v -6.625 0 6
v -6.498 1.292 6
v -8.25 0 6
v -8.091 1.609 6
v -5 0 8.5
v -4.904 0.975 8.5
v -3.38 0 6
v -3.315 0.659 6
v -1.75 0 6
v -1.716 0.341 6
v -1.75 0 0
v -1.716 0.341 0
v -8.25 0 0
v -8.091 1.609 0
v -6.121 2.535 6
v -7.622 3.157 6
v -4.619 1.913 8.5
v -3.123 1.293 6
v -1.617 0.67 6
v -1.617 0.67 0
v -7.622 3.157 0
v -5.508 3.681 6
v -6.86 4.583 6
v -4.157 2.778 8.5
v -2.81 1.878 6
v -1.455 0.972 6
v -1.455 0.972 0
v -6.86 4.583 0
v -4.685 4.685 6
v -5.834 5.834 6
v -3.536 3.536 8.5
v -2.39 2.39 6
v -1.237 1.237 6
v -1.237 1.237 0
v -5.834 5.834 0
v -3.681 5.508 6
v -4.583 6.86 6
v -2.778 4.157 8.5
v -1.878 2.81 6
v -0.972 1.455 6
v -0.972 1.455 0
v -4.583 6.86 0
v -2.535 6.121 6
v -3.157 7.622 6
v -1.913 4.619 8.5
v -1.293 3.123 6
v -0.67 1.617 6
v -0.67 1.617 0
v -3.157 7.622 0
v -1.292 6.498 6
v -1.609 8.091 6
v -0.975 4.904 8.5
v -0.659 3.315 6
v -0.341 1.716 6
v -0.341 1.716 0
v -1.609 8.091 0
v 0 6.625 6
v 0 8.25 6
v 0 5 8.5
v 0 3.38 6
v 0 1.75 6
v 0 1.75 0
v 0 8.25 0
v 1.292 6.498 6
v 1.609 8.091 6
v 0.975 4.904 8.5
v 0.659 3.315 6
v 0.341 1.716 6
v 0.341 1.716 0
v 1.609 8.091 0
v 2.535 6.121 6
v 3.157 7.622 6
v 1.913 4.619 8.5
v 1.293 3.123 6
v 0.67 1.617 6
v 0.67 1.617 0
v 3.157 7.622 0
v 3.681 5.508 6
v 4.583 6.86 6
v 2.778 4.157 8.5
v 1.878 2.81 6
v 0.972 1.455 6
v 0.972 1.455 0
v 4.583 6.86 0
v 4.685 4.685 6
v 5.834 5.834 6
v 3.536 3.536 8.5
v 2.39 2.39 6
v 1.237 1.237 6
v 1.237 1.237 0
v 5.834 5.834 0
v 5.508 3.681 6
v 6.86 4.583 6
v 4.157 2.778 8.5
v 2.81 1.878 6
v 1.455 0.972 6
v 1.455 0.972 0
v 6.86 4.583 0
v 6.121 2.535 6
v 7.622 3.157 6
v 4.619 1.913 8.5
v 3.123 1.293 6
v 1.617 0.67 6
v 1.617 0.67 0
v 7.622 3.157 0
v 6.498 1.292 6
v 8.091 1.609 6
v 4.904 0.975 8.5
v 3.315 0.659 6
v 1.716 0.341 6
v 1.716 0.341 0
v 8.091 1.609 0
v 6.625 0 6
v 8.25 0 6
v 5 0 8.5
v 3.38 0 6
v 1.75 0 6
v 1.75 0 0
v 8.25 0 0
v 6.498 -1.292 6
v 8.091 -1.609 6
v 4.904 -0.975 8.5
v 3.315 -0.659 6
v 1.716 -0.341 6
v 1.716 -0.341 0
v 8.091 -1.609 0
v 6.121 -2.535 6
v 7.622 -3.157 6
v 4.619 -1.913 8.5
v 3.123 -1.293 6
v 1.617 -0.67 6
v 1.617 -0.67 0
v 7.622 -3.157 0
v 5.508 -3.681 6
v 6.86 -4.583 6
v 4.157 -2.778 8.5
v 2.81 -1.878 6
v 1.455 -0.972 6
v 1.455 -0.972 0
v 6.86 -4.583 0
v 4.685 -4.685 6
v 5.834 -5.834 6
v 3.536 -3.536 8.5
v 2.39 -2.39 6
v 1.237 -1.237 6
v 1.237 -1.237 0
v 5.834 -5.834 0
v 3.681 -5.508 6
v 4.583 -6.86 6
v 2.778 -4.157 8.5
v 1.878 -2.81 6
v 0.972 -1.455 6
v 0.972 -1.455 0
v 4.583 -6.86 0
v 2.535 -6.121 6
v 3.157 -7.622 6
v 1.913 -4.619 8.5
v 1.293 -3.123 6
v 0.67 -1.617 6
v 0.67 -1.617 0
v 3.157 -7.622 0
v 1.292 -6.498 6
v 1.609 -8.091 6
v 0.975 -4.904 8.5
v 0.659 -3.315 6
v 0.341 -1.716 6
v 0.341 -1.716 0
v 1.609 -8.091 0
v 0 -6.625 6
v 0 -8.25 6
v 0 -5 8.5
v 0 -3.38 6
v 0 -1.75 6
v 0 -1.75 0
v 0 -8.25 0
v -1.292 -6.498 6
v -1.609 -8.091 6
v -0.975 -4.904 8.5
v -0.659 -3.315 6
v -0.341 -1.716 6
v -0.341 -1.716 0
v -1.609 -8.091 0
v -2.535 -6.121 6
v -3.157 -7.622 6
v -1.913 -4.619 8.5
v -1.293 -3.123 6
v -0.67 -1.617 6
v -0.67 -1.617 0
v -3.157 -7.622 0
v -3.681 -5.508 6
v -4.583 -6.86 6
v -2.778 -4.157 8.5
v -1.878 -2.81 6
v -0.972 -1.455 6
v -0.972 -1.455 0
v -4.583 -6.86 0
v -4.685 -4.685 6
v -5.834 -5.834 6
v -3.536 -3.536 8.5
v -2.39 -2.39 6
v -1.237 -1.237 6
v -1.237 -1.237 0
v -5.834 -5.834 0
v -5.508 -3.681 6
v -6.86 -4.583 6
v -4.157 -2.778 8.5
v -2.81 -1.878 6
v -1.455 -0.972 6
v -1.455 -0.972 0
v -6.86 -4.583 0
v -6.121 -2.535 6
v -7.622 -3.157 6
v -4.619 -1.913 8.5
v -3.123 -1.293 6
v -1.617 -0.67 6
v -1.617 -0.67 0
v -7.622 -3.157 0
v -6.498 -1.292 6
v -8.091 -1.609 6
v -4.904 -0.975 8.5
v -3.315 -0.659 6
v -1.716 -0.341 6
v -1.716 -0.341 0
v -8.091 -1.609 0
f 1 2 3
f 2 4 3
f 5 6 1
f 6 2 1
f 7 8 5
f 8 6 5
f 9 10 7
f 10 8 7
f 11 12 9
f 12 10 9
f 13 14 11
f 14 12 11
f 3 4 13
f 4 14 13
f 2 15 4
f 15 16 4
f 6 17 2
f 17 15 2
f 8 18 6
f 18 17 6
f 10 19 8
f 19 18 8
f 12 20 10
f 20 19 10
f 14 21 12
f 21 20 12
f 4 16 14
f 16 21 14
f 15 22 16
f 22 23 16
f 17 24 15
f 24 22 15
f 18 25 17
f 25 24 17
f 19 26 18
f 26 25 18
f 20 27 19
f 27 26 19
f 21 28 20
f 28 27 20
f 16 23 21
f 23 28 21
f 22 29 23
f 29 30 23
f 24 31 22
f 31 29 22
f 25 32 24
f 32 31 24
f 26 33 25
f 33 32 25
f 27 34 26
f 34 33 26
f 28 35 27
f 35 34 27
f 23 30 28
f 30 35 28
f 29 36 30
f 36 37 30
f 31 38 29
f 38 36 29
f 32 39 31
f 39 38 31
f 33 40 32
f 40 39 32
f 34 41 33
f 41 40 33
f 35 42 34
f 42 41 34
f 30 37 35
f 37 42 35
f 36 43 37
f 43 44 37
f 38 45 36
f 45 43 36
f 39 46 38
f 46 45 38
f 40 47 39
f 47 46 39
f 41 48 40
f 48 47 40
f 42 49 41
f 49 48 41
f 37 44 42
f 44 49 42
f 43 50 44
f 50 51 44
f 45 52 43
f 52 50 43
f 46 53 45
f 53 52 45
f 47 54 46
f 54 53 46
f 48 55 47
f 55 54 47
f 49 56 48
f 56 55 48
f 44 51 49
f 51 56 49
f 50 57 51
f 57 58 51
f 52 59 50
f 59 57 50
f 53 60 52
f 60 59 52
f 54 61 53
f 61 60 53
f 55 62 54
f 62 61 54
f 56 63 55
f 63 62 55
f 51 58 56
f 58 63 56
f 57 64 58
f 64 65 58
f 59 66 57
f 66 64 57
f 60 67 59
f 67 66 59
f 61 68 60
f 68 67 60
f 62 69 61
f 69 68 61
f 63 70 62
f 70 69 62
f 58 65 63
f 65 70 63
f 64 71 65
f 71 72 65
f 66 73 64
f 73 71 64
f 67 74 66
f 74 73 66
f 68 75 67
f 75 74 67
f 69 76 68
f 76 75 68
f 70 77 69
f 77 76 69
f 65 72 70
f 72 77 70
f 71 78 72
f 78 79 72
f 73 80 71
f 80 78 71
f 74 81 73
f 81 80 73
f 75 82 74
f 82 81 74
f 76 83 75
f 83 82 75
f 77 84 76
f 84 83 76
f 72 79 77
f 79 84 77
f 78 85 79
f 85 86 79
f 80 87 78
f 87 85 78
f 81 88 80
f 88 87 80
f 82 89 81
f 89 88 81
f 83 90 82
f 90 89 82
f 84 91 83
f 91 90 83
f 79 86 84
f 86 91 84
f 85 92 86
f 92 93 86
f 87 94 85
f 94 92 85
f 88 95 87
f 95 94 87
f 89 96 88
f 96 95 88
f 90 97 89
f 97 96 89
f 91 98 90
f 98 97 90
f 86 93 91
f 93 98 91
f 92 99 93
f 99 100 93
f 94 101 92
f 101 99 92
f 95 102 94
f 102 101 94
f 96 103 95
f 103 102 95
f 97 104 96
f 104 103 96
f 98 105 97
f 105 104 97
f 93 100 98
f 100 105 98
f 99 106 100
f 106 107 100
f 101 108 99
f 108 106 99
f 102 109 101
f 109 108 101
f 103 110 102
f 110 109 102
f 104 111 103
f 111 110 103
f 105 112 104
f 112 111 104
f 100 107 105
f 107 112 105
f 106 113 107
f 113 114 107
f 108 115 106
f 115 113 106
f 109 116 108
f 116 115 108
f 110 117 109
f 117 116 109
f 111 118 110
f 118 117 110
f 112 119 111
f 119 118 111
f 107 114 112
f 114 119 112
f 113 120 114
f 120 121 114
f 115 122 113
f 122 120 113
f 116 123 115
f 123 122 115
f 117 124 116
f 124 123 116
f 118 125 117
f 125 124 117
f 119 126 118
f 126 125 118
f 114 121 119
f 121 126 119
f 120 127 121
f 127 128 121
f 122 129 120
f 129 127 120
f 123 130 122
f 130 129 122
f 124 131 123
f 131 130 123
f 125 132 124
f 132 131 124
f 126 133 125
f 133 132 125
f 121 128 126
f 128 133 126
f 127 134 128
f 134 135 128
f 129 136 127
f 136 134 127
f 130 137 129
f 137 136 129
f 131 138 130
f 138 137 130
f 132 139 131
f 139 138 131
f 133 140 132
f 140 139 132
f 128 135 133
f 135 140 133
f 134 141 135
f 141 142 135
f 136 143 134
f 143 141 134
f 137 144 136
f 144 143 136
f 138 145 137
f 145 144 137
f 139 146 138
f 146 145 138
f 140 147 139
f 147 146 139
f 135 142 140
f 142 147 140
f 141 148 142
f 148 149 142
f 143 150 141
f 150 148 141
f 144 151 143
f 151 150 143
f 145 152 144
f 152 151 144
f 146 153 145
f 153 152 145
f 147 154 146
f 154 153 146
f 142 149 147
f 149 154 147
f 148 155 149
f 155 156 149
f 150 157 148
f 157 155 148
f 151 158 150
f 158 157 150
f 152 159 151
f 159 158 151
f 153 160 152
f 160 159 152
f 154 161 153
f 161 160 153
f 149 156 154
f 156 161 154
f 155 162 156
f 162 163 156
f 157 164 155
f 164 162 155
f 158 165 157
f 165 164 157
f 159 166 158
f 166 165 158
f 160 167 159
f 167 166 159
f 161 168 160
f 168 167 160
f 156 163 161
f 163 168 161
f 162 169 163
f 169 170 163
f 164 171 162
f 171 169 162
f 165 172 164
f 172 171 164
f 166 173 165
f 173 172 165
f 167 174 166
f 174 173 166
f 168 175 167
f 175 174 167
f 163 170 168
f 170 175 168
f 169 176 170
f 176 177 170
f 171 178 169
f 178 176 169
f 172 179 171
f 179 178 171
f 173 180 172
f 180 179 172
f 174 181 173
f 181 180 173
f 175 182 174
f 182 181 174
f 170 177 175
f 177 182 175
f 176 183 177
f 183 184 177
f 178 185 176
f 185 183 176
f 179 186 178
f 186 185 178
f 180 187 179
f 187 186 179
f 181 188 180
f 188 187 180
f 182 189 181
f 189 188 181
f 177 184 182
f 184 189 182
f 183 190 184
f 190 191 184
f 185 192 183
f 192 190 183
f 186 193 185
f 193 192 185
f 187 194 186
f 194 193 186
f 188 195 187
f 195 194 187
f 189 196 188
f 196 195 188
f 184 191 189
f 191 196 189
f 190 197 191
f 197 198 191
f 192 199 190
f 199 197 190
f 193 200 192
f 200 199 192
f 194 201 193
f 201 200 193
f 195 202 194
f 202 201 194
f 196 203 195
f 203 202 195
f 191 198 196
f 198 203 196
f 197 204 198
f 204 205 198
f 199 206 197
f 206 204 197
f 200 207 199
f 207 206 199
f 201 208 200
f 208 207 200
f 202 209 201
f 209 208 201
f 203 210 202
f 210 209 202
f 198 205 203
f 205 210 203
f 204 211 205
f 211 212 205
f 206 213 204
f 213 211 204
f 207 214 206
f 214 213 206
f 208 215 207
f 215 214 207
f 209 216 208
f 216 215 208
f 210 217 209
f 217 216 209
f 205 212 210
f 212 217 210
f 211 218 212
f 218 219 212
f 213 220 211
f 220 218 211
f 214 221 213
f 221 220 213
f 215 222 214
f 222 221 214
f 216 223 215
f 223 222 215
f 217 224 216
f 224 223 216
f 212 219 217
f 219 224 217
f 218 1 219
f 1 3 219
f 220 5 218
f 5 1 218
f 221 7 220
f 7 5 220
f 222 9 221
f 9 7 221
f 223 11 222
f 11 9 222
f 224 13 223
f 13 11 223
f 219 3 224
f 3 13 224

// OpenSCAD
$fn = 32;

// ----------------------------------------------------------------------
// Form washer: domed washer, 16.5 mm outside, 3.5 mm bore
// ----------------------------------------------------------------------

// --- parameters (mm) ---
revolve_angle = 360;      // full turn around the Z axis
profile_points = 7;       // points of the closed outline

profile = [[1.75, 0], [8.25, 0], [8.25, 6], [6.625, 6], [5, 8.5], [3.38, 6], [1.75, 6]];  // single closed polygon, 7 points, counter clockwise

// --- the one profile operation ---
rotate_extrude(angle = revolve_angle) polygon(points = profile);
